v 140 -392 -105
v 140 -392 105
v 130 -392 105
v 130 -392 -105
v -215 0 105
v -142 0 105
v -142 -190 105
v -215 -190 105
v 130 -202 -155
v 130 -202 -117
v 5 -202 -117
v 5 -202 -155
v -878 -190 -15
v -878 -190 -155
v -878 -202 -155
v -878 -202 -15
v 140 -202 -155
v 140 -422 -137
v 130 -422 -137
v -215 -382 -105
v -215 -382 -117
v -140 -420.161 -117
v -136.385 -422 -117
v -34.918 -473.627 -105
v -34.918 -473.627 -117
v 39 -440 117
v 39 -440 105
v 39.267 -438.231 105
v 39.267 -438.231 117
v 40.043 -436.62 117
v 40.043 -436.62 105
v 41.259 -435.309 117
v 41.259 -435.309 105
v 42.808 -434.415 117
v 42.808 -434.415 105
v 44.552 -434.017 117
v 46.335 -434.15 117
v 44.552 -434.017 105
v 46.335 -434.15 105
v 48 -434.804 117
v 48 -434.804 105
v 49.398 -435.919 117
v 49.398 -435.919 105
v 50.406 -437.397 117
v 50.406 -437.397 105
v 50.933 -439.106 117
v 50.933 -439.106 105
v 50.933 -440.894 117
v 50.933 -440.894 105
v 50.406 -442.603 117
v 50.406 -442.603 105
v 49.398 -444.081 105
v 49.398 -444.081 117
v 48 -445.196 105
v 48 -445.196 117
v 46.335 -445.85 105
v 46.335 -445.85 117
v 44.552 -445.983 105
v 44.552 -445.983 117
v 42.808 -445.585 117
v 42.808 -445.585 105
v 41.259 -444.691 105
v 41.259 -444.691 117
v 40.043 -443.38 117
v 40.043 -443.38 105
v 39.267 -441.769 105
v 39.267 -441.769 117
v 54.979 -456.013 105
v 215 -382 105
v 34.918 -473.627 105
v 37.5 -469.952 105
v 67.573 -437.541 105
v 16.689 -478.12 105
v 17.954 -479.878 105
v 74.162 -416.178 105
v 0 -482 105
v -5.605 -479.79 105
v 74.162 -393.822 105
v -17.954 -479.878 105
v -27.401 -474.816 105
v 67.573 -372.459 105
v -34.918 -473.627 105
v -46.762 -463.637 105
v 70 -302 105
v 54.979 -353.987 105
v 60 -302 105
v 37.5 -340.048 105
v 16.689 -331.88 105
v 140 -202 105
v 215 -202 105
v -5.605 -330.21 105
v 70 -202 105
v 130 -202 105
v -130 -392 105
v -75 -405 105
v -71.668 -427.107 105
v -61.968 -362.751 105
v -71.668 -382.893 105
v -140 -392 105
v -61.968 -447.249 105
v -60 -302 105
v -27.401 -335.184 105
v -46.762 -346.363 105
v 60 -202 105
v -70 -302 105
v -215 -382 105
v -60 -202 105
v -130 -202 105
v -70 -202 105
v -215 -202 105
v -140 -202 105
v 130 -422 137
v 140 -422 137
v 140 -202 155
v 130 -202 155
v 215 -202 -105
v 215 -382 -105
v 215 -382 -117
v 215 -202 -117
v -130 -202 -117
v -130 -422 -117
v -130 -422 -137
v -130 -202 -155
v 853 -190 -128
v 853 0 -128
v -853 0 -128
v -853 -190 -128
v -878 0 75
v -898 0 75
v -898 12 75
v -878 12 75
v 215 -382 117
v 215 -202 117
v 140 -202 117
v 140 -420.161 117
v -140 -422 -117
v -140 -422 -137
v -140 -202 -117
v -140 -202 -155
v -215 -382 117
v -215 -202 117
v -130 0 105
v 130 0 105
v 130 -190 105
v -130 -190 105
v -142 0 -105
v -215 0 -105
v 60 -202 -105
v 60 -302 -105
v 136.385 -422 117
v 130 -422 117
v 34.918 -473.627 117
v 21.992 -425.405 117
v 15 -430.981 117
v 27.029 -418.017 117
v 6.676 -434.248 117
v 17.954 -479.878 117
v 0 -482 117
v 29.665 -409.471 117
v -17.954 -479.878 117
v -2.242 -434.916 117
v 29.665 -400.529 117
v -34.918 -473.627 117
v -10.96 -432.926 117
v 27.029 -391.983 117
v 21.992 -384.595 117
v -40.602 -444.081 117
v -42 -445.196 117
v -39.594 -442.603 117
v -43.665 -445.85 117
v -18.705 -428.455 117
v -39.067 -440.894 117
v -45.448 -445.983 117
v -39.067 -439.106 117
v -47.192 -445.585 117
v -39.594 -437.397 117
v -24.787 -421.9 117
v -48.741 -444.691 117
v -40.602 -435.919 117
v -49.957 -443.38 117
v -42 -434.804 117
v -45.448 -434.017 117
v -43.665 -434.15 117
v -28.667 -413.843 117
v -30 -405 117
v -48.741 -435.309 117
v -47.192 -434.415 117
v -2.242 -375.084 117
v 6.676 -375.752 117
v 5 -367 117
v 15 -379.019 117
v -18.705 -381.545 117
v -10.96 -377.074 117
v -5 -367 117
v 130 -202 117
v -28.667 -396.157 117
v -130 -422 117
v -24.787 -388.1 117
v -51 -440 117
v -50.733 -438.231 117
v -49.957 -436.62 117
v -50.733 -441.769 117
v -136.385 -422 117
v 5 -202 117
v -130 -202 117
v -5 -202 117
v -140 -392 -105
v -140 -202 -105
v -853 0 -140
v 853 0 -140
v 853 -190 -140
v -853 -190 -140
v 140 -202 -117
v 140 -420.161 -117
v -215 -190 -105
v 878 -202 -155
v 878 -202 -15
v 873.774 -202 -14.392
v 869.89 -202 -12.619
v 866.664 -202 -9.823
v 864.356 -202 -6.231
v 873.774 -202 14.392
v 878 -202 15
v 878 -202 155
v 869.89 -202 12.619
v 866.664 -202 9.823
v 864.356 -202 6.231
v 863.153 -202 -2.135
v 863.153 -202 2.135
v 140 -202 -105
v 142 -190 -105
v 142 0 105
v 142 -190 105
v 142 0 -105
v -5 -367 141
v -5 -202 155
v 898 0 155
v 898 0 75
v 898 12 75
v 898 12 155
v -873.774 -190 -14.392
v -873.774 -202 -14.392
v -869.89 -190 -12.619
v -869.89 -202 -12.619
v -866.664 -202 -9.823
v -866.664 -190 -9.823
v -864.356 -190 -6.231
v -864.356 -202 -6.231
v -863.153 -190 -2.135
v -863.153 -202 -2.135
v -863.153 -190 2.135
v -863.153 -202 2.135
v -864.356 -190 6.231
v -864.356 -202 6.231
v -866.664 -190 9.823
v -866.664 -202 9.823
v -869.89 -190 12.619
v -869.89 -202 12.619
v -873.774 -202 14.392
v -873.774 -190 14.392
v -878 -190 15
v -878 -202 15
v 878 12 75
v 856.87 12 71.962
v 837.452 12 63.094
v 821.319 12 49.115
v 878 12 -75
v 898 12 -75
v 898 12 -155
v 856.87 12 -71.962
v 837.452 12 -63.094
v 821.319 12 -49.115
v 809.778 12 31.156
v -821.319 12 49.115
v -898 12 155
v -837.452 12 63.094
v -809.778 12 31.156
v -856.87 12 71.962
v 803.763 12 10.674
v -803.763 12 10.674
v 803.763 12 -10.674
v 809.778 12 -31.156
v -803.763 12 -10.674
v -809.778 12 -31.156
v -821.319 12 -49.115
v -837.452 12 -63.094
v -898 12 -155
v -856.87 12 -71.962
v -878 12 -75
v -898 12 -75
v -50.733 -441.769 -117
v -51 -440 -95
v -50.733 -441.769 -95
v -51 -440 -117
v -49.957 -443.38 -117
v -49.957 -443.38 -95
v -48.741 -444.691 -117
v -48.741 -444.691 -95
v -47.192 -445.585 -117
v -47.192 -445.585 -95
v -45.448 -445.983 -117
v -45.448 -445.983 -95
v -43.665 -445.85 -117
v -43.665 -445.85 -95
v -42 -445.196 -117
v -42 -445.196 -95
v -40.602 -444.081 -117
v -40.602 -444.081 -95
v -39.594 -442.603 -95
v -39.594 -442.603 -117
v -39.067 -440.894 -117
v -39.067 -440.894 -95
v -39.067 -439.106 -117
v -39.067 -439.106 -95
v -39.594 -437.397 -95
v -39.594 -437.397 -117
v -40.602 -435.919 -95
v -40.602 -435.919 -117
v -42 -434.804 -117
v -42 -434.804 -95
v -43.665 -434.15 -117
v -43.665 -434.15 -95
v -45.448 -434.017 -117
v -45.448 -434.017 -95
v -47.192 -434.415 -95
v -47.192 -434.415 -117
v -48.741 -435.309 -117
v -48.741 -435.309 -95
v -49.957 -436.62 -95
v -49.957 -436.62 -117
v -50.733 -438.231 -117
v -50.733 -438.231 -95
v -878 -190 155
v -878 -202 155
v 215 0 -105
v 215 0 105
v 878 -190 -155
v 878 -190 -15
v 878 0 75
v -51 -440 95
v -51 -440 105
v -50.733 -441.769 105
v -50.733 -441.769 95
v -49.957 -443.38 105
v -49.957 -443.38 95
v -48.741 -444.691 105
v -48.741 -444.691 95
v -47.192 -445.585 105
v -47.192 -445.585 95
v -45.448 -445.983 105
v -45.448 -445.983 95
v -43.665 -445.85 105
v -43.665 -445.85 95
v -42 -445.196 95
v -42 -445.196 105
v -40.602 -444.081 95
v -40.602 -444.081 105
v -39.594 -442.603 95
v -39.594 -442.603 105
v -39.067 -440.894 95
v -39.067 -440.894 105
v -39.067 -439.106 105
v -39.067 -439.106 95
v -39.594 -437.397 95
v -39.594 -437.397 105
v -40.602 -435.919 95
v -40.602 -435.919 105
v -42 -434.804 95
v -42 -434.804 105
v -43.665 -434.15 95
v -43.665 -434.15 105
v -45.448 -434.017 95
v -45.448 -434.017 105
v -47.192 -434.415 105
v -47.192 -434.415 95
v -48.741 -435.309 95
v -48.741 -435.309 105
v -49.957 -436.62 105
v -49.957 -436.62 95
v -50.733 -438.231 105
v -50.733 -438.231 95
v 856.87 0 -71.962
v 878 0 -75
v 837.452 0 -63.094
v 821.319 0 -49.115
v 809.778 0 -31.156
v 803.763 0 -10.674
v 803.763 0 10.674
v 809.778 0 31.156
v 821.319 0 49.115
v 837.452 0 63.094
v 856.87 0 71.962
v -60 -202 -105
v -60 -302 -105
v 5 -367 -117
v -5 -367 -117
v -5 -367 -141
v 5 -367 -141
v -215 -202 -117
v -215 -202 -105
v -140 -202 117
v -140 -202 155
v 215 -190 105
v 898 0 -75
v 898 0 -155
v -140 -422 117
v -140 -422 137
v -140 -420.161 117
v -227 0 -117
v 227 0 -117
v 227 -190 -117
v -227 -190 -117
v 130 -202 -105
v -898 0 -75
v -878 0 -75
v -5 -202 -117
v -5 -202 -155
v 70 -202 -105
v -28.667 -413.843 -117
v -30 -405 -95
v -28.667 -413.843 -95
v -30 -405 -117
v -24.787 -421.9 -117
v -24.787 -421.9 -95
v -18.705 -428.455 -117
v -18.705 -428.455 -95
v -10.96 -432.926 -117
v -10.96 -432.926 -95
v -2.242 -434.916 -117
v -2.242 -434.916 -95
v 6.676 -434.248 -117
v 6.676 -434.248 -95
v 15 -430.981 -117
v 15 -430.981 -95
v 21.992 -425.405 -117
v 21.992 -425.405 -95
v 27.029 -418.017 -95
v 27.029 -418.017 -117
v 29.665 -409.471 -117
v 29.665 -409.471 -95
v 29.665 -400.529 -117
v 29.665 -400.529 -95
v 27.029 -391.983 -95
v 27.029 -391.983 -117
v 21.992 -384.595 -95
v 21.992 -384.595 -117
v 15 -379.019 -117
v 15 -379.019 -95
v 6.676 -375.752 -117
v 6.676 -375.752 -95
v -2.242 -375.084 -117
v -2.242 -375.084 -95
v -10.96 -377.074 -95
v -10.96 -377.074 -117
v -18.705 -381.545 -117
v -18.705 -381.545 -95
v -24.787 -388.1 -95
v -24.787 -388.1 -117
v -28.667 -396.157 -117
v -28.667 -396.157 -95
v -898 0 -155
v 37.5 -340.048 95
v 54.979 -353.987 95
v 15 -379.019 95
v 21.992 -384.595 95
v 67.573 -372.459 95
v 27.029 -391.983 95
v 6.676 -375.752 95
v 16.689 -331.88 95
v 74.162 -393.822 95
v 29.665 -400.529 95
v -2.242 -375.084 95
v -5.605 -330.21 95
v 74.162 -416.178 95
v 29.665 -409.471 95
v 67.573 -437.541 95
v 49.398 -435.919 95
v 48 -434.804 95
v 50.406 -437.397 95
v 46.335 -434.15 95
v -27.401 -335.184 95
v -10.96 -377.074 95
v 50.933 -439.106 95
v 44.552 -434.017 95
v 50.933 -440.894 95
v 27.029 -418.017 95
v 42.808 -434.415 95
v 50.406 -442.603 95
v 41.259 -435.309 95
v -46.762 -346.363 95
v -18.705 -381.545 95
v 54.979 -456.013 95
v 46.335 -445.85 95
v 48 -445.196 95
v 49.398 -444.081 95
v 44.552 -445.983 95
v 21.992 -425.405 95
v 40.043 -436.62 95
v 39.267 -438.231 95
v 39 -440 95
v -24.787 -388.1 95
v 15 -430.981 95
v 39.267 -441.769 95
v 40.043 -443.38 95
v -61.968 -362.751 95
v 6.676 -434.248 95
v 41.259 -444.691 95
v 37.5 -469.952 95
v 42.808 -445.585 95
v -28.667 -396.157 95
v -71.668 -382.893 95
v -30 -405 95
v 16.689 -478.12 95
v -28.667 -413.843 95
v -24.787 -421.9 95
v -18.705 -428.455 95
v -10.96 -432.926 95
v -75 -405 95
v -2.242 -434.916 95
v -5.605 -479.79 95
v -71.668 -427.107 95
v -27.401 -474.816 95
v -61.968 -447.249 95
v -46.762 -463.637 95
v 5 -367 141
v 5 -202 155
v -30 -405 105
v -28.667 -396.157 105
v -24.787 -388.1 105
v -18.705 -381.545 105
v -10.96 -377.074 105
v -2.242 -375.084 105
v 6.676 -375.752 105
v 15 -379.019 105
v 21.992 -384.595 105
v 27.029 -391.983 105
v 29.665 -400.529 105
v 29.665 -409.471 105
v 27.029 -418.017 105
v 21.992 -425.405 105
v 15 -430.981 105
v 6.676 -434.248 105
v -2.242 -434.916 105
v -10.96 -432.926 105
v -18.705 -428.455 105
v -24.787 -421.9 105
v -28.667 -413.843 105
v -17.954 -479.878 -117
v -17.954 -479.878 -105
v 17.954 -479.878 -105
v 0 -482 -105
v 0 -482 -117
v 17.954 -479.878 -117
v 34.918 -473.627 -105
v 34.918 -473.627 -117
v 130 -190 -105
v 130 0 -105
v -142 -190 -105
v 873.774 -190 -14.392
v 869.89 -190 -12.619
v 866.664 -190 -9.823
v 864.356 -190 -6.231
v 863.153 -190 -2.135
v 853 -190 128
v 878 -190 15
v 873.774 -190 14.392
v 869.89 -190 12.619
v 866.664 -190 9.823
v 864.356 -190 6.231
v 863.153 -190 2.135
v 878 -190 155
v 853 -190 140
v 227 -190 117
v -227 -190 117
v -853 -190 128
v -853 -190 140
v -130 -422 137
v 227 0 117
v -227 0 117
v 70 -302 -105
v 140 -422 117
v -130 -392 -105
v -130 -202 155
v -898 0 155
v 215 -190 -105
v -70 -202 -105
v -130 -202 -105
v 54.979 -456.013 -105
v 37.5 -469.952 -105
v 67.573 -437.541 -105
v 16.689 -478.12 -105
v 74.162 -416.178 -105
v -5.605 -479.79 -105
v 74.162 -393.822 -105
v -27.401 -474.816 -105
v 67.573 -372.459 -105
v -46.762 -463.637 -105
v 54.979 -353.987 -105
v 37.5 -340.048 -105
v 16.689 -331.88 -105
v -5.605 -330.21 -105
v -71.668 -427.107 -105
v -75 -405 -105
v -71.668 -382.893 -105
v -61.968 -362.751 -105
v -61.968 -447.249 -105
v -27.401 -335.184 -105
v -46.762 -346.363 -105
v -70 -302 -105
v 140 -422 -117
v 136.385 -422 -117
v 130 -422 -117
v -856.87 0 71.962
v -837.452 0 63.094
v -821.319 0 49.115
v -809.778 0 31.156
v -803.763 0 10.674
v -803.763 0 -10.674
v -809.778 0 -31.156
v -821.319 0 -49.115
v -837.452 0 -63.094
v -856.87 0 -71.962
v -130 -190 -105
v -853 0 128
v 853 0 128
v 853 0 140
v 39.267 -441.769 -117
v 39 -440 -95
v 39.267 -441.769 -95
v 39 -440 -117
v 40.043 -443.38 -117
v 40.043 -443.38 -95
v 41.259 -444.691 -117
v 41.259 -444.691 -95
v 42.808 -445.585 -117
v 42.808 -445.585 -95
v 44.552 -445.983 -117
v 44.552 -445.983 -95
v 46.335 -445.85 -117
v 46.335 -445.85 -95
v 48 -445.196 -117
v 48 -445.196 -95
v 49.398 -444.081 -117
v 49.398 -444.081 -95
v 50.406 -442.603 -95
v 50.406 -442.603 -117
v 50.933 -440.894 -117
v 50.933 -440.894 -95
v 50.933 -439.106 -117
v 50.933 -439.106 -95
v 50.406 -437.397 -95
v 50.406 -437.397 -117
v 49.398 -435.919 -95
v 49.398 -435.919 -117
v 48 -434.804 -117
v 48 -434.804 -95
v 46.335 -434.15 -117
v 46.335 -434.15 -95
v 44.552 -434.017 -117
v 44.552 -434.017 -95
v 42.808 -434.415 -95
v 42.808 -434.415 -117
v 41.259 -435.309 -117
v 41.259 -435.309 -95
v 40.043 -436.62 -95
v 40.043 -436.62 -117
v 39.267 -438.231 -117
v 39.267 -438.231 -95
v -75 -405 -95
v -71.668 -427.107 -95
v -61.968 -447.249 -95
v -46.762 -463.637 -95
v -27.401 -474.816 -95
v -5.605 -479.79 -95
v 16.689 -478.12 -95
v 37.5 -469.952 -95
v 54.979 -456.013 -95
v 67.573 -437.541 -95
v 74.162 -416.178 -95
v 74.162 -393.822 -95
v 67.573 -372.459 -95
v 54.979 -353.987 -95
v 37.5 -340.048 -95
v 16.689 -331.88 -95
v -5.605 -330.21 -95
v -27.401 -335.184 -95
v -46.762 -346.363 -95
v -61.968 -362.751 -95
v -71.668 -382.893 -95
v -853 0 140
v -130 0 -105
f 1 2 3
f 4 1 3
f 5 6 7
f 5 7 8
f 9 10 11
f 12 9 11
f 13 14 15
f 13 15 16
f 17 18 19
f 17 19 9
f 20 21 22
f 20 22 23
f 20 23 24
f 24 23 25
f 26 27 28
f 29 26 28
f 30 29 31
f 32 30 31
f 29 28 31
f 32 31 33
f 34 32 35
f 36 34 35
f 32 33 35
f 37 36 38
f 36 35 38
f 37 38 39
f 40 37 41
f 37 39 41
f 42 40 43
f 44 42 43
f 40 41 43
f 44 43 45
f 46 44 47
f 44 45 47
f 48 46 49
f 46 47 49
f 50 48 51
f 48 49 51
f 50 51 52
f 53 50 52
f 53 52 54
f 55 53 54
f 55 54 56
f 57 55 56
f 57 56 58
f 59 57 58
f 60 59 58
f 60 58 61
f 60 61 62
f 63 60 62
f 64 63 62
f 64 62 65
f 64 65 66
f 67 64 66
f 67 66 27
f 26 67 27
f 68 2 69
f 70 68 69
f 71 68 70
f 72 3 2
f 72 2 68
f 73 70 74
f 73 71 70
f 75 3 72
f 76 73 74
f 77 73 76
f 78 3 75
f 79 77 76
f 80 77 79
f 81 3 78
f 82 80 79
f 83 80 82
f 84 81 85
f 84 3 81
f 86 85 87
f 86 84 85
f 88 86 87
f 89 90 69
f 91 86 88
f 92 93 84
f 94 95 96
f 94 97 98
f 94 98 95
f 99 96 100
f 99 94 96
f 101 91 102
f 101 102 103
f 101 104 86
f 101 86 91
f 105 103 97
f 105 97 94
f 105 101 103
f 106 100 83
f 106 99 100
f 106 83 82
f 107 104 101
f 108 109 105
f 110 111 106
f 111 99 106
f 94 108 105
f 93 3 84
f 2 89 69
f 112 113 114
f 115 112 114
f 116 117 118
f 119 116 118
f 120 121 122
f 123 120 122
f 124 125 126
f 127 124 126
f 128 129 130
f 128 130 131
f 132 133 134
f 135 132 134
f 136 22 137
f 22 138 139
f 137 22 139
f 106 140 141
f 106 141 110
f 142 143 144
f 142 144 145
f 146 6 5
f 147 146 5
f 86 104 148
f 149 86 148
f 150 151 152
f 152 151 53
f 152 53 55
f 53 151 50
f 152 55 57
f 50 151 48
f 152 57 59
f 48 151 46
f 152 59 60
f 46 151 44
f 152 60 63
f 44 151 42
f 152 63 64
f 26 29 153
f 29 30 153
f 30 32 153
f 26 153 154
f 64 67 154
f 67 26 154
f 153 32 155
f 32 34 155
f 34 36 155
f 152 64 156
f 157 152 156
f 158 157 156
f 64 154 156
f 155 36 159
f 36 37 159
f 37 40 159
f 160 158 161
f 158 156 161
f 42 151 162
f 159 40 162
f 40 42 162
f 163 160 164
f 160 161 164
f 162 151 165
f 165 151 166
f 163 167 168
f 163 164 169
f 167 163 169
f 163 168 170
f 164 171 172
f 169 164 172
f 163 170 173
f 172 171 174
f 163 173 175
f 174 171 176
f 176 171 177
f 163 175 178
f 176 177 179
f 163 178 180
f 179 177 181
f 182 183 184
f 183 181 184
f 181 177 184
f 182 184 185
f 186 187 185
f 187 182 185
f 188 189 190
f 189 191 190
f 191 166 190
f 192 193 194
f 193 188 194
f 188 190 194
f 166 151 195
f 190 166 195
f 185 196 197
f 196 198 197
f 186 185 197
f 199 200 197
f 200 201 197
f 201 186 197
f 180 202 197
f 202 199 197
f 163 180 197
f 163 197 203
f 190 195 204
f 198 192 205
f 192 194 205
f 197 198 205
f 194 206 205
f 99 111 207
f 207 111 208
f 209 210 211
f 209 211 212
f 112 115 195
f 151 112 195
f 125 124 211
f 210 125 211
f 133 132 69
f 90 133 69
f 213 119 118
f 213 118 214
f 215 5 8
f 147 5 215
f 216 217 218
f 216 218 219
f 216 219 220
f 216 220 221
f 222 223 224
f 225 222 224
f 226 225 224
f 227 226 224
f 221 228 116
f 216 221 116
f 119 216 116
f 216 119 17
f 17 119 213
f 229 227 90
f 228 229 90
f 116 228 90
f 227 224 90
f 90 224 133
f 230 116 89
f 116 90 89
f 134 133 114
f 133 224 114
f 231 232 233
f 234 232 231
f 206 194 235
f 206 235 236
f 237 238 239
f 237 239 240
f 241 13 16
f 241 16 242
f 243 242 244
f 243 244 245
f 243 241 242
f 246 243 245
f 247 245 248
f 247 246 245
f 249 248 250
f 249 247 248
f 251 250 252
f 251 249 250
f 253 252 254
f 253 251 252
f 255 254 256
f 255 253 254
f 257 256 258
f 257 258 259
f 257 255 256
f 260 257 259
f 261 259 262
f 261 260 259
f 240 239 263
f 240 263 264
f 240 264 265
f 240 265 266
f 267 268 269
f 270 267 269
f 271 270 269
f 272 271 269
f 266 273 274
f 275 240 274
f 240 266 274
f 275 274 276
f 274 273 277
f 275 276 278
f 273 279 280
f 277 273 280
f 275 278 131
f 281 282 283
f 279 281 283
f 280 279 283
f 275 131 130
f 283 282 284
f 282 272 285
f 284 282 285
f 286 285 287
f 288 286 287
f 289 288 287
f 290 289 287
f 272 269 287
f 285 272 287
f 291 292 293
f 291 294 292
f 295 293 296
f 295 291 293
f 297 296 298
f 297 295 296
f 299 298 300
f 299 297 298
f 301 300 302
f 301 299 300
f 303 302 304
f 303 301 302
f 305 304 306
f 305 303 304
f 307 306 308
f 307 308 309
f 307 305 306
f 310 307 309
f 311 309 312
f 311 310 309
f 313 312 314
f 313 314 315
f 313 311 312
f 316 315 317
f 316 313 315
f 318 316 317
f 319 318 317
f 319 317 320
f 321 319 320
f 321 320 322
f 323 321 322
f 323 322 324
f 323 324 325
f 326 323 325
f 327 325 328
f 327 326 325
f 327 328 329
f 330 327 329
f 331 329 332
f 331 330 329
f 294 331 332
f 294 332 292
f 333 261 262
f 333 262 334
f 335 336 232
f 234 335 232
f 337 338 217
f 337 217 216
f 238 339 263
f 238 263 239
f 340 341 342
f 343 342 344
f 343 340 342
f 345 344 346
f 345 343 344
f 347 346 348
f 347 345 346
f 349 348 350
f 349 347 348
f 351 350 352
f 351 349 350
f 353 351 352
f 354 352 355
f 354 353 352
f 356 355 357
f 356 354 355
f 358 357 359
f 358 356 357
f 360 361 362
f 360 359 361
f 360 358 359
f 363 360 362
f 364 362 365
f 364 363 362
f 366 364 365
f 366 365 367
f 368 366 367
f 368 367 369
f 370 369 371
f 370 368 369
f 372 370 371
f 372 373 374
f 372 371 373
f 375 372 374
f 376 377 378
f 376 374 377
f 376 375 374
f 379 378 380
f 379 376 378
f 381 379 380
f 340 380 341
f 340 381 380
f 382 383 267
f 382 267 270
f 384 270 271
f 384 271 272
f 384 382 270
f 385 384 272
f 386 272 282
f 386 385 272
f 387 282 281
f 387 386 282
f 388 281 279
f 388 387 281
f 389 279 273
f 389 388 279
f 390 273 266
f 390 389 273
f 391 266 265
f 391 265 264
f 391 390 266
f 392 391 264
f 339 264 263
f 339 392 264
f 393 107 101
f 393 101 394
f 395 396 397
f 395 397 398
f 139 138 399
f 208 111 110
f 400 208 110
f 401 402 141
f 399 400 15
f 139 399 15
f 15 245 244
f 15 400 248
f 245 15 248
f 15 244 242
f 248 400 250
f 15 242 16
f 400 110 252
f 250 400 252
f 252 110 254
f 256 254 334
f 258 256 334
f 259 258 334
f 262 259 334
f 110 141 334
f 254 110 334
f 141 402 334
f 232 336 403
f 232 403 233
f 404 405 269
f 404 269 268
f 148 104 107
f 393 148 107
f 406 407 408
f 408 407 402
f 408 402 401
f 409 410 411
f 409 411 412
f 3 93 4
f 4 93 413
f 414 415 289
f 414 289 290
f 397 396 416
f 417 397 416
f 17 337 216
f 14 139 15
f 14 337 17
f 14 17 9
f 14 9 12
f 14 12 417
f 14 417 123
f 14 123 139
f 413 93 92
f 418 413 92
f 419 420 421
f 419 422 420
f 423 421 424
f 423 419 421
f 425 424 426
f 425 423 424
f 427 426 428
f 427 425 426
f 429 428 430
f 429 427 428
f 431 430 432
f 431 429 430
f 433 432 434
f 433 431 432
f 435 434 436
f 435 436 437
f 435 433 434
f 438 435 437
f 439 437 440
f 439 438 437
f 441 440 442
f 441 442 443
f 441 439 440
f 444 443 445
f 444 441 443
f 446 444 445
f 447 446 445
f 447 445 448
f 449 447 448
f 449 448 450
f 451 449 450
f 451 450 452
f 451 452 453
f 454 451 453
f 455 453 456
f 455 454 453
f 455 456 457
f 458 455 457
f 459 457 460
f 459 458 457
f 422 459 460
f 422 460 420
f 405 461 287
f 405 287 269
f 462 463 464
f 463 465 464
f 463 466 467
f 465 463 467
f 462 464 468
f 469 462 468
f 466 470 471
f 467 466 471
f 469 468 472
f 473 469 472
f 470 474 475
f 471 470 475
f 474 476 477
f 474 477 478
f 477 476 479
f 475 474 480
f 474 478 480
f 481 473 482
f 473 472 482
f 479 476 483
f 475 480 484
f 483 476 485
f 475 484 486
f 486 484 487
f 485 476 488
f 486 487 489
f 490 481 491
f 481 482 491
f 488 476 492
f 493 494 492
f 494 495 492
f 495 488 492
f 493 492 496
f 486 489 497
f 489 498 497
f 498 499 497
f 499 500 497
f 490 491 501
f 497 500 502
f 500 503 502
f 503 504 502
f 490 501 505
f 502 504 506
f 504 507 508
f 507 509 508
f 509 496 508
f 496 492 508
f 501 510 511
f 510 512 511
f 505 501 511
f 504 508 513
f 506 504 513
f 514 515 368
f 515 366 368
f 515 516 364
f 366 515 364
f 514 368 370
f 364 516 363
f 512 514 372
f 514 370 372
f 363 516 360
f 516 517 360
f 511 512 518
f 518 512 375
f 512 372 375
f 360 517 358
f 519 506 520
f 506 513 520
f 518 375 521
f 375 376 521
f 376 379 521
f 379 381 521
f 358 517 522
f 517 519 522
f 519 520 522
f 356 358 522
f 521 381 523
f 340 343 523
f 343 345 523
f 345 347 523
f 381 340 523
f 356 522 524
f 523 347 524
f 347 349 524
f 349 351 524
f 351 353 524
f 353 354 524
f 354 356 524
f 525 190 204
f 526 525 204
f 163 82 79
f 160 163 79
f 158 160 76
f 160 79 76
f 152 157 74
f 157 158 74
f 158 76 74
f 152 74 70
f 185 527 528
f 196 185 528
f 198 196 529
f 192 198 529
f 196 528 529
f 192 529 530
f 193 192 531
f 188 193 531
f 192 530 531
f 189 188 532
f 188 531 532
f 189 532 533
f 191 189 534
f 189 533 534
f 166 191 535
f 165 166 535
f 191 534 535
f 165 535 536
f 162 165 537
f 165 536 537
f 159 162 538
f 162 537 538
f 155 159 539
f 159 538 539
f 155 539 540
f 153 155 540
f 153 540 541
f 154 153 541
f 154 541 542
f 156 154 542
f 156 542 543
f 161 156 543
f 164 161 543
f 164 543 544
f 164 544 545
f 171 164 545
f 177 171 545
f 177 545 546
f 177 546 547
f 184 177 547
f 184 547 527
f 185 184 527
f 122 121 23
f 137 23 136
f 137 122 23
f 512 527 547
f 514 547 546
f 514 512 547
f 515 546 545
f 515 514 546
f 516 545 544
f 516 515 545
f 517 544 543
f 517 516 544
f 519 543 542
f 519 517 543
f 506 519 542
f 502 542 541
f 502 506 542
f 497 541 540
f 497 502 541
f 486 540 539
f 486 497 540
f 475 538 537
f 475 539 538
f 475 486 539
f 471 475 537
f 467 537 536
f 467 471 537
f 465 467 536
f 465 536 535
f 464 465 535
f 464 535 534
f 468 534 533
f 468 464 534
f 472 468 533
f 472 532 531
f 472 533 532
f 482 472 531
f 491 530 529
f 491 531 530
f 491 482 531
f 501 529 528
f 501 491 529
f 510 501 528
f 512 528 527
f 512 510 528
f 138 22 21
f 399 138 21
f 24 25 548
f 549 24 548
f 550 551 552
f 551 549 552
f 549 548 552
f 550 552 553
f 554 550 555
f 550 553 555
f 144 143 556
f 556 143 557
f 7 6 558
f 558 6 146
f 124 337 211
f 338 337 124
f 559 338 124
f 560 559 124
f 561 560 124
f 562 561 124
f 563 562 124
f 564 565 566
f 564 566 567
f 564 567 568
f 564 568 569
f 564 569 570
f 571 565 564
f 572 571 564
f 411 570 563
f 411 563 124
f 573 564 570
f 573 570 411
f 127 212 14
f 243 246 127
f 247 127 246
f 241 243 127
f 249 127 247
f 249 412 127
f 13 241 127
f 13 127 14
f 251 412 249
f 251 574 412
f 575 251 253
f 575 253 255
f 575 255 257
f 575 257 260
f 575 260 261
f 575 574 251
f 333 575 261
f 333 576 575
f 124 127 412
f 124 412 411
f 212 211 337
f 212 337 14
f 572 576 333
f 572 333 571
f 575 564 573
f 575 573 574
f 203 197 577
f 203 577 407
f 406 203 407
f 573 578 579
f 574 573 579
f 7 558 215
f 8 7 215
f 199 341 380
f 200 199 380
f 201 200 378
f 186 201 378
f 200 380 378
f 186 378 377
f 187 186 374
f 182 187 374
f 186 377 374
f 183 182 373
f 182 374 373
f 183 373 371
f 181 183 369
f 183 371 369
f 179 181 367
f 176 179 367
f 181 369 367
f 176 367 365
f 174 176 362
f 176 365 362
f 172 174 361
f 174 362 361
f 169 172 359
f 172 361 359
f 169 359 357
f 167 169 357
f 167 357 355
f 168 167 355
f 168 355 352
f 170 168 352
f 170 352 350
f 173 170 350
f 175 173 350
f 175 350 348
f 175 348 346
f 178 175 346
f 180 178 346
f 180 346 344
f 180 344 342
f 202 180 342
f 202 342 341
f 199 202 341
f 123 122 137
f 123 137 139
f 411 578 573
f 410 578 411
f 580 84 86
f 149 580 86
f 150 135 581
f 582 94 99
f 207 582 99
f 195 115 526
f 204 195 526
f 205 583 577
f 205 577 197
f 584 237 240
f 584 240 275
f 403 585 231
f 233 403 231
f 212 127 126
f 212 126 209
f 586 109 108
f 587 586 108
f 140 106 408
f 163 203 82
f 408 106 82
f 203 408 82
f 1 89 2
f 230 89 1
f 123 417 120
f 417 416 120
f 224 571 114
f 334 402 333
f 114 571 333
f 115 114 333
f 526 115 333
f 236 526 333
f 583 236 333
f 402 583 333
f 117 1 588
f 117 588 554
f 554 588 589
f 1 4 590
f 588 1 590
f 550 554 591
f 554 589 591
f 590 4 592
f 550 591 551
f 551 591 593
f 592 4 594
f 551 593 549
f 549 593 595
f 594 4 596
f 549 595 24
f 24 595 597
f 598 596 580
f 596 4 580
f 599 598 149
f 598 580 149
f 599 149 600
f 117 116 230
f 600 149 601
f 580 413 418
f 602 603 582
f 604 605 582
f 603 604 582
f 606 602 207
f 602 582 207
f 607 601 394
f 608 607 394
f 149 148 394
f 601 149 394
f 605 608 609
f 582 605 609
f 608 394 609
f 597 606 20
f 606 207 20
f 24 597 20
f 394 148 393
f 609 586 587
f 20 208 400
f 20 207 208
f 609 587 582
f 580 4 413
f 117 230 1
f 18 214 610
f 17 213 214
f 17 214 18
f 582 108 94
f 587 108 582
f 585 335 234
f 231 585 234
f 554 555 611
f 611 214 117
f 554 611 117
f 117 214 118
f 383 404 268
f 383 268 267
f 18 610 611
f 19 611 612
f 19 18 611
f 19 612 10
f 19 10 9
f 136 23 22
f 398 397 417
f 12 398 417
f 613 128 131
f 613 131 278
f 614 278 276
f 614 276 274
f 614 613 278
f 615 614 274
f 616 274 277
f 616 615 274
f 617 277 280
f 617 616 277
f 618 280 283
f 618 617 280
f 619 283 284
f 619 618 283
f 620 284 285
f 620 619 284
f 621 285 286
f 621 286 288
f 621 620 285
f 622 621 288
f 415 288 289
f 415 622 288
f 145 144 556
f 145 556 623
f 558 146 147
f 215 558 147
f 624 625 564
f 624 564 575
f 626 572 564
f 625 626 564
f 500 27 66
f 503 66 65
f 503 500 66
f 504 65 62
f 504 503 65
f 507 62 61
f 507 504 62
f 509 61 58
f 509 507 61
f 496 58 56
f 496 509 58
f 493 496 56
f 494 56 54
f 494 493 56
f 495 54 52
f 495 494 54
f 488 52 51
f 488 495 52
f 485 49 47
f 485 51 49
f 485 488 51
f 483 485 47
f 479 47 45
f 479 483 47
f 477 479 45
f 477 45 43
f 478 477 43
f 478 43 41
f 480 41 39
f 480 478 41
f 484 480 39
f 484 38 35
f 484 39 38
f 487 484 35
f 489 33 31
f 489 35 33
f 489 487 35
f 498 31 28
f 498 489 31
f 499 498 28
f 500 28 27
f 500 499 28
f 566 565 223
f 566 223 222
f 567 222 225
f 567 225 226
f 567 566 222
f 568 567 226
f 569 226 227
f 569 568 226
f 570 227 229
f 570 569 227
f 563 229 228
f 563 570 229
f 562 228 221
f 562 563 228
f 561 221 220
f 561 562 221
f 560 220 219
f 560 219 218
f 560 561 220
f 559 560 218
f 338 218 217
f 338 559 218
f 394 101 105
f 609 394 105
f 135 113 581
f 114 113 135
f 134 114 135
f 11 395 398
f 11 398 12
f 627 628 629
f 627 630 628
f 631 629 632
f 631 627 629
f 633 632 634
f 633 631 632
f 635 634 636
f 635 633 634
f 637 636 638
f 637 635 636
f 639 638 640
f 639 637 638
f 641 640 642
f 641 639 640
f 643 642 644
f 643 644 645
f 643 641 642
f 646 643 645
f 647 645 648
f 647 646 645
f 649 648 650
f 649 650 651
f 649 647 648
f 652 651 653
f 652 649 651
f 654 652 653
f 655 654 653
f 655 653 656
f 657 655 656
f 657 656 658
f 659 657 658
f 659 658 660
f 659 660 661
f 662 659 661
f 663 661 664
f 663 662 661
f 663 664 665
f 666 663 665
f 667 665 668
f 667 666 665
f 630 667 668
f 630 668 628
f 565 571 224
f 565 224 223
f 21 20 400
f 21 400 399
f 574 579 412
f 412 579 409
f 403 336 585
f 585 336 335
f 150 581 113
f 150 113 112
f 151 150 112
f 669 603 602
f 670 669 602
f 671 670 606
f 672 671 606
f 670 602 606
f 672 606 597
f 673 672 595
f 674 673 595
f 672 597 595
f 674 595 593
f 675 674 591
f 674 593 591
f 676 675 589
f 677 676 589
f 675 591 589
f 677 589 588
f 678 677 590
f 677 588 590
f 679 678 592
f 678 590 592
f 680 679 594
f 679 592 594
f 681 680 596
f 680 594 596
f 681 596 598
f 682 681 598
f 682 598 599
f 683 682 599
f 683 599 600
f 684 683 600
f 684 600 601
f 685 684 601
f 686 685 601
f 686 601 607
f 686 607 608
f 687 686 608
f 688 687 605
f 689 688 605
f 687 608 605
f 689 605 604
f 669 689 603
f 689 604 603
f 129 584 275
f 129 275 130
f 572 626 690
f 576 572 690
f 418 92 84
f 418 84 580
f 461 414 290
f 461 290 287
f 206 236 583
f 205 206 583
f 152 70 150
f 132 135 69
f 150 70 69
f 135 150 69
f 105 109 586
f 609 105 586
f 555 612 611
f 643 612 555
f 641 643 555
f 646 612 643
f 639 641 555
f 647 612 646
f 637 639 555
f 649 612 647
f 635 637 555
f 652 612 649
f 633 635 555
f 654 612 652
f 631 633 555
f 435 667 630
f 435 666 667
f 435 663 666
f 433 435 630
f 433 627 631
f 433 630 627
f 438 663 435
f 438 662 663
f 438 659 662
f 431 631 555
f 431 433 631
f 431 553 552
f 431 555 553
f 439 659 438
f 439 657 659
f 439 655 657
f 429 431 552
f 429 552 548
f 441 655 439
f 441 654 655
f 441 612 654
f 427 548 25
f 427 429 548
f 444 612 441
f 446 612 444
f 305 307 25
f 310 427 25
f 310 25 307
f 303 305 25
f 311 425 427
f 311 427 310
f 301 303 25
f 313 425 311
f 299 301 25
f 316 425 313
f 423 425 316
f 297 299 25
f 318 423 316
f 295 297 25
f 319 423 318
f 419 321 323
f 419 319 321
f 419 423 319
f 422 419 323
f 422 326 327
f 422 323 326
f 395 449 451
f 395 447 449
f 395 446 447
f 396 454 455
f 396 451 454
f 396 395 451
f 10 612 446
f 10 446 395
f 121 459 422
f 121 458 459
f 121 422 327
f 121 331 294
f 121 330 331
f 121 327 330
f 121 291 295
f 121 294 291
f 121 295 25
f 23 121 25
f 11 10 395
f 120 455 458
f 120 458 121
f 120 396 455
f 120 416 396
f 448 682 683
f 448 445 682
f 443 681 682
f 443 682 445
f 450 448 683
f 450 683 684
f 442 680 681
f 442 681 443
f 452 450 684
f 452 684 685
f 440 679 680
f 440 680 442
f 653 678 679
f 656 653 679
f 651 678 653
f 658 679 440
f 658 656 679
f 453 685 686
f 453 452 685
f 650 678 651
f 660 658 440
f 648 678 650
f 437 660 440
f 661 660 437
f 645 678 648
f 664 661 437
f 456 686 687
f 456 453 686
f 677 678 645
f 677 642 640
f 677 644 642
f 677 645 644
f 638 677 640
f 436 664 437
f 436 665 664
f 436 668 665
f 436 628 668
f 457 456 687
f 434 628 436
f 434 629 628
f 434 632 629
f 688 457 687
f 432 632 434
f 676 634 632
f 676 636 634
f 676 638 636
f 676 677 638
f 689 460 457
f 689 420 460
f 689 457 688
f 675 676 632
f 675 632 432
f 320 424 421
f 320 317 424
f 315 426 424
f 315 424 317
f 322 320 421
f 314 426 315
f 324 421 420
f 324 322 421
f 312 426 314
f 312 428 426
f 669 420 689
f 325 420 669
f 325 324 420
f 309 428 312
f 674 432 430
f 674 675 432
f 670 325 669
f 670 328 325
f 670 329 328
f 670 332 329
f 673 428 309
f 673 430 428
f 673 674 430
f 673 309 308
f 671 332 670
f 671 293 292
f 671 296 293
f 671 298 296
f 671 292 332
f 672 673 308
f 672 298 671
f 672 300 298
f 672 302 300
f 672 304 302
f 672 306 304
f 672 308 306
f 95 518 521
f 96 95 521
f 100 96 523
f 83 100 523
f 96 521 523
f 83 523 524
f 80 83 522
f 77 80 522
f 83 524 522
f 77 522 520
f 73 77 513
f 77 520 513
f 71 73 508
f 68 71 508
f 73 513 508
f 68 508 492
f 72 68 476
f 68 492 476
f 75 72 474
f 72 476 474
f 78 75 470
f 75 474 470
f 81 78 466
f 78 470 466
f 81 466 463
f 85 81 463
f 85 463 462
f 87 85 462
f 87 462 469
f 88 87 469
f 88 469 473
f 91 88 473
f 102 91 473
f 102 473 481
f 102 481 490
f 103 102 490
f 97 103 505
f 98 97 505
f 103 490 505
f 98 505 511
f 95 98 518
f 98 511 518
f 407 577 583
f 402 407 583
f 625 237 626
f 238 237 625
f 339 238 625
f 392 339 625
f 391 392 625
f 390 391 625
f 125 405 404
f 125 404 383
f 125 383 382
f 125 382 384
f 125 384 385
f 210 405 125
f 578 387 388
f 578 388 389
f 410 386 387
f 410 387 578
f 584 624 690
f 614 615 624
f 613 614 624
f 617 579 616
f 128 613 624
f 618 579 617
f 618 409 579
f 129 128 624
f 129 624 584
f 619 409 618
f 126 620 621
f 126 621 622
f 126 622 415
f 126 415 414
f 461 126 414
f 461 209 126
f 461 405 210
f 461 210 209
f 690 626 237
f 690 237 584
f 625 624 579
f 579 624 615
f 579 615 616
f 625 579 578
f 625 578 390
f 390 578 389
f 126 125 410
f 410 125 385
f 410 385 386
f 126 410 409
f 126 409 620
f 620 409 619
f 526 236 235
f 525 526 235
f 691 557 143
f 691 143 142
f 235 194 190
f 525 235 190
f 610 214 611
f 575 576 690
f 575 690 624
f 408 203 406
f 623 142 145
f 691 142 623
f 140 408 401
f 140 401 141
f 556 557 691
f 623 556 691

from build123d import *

# Parameters (mm, degrees)
EXTRUDE_1_DEPTH        = 12
SKETCH_2_W             = 1706
SKETCH_2_H             = 12
EXTRUDE_2_DEPTH        = 190
EXTRUDE_3_DEPTH        = 12
SKETCH_4_W             = 430
SKETCH_4_H             = 12
EXTRUDE_4_DEPTH        = 502
SKETCH_5_R             = 30
SKETCH_5_R_2           = 6
CUT_EXTRUDE_1_DEPTH    = 1065.139088653
SKETCH_6_W             = 10
SKETCH_6_H             = 165
EXTRUDE_5_DEPTH        = 38
CUT_EXTRUDE_2_DEPTH    = 10
SKETCH_8_W             = 10
SKETCH_8_H             = 210
EXTRUDE_6_DEPTH        = 190
SKETCH_9_W             = 10
SKETCH_9_H             = 38
EXTRUDE_7_DEPTH        = 220
CUT_EXTRUDE_3_DEPTH    = 18
PATTERN_LINEAR_1_COUNT = 2
PATTERN_LINEAR_1_PITCH = 270
SKETCH_11_W            = 12
SKETCH_11_H            = 234
SKETCH_11_H_2          = 210
EXTRUDE_8_DEPTH        = 190
SKETCH_12_R            = 75
SKETCH_12_R_2          = 30
SKETCH_12_R_3          = 6
EXTRUDE_9_DEPTH        = 10
PATTERN_LINEAR_2_COUNT = 2
PATTERN_LINEAR_2_PITCH = 200
SKETCH_14_W            = 10
SKETCH_14_H            = 210
EXTRUDE_10_DEPTH       = 100


with BuildPart() as part:
    # 草图1 → 凸台-拉伸1 (new body)
    with BuildSketch(Plane(origin=(0, 0, 0), x_dir=(1, 0, 0), z_dir=(0, 1, 0))):
        with BuildLine():
            Line((-898, 155), (898, 155))
            Line((898, 155), (898, 75))
            Line((898, 75), (878, 75))
            ThreePointArc((878, 75), (803, 0), (878, -75))
            Line((878, -75), (898, -75))
            Line((898, -75), (898, -155))
            Line((898, -155), (-898, -155))
            Line((-898, -155), (-898, -75))
            Line((-898, -75), (-878, -75))
            ThreePointArc((-878, -75), (-803, 0), (-878, 75))
            Line((-878, 75), (-898, 75))
            Line((-898, 75), (-898, 155))
        make_face()
    extrude(amount=EXTRUDE_1_DEPTH)

    # 草图2 → 凸台-拉伸2 (add)
    with BuildSketch(Plane(origin=(0, 0, 0), x_dir=(-1, 0, 0), z_dir=(0, -1, 0))):
        with Locations((0, 134)):
            Rectangle(SKETCH_2_W, SKETCH_2_H)
        with Locations((0, -134)):
            Rectangle(SKETCH_2_W, SKETCH_2_H)
    extrude(amount=EXTRUDE_2_DEPTH)

    # 草图3 → 凸台-拉伸3 (add)
    with BuildSketch(Plane.XZ.offset(190)):
        with BuildLine():
            Line((-878, 155), (878, 155))
            Line((878, 155), (878, 15))
            ThreePointArc((878, 15), (863, 0), (878, -15))
            Line((878, -15), (878, -155))
            Line((878, -155), (-878, -155))
            Line((-878, -155), (-878, -15))
            ThreePointArc((-878, -15), (-863, 0), (-878, 15))
            Line((-878, 15), (-878, 155))
        make_face()
    extrude(amount=EXTRUDE_3_DEPTH)

    # 草图4 → 凸台-拉伸4 (add)
    with BuildSketch(Plane(origin=(0, 0, 0), x_dir=(-1, 0, 0), z_dir=(0, -1, 0))):
        with Locations((0, -111)):
            Rectangle(SKETCH_4_W, SKETCH_4_H)
        with Locations((0, 111)):
            Rectangle(SKETCH_4_W, SKETCH_4_H)
    extrude(amount=EXTRUDE_4_DEPTH)

    # 草图5 → 切除-拉伸1 (cut, through all)
    with BuildSketch(Plane(origin=(0, 0, -117), x_dir=(-1, 0, 0), z_dir=(0, 0, -1))):
        with Locations((0, -405)):
            Circle(SKETCH_5_R)
        with Locations((-45, -440)):
            Circle(SKETCH_5_R_2)
        with Locations((45, -440)):
            Circle(SKETCH_5_R_2)
        with BuildLine():
            Line((-215, -382), (-215, -502))
            Line((-215, -502), (215, -502))
            Line((215, -502), (215, -382))
            Line((215, -382), (34.918275337, -473.627356408))
            ThreePointArc((34.918275337, -473.627356408), (0, -482), (-34.918275337, -473.627356408))
            Line((-34.918275337, -473.627356408), (-215, -382))
        make_face()
    extrude(amount=-CUT_EXTRUDE_1_DEPTH, mode=Mode.SUBTRACT)

    # 草图6 → 凸台-拉伸5 (add)
    with BuildSketch(Plane.XY.offset(117)):
        with Locations((0, -284.5)):
            Rectangle(SKETCH_6_W, SKETCH_6_H)
    extrude_5 = extrude(amount=EXTRUDE_5_DEPTH)

    # 镜向1: 凸台-拉伸5 across plane
    add(extrude_5.mirror(Plane.XY))

    # 草图7 → 切除-拉伸2 (cut)
    with BuildSketch(Plane.ZY.offset(5)):
        Polygon((-155, -202), (-155, -367), (-141, -367), align=None)
        Polygon((155, -202), (141, -367), (155, -367), align=None)
    extrude(amount=-CUT_EXTRUDE_2_DEPTH, mode=Mode.SUBTRACT)

    # 草图8 → 凸台-拉伸6 (add)
    with BuildSketch(Plane(origin=(0, -202, 0), x_dir=(-1, 0, 0), z_dir=(0, -1, 0))):
        with Locations((135, 0)):
            Rectangle(SKETCH_8_W, SKETCH_8_H)
        with Locations((-135, 0)):
            Rectangle(SKETCH_8_W, SKETCH_8_H)
    extrude(amount=EXTRUDE_6_DEPTH)

    # 草图9 → 凸台-拉伸7 (add)
    with BuildSketch(Plane(origin=(0, -202, 0), x_dir=(-1, 0, 0), z_dir=(0, -1, 0))):
        with Locations((135, -136)):
            Rectangle(SKETCH_9_W, SKETCH_9_H)
        with Locations((-135, -136)):
            Rectangle(SKETCH_9_W, SKETCH_9_H)
        with Locations((135, 136)):
            Rectangle(SKETCH_9_W, SKETCH_9_H)
        with Locations((-135, 136)):
            Rectangle(SKETCH_9_W, SKETCH_9_H)
    extrude(amount=EXTRUDE_7_DEPTH)

    # 草图10 → 切除-拉伸3 (cut)
    with BuildSketch(Plane(origin=(140, 0, 0), x_dir=(0, 0, -1), z_dir=(1, 0, 0))):
        Polygon((-155, -202), (-155, -422), (-137, -422), align=None)
        Polygon((155, -202), (155, -422), (137, -422), align=None)
    cut_extrude_3 = extrude(amount=-CUT_EXTRUDE_3_DEPTH, mode=Mode.SUBTRACT)

    # 阵列(线性)1: 切除-拉伸3 ×2
    with Locations(*[(-i * PATTERN_LINEAR_1_PITCH, 0, 0) for i in range(1, PATTERN_LINEAR_1_COUNT)]):
        add(cut_extrude_3, mode=Mode.SUBTRACT)

    # 草图11 → 凸台-拉伸8 (add)
    with BuildSketch(Plane(origin=(0, 0, 0), x_dir=(-1, 0, 0), z_dir=(0, -1, 0))):
        with Locations((-221, 0)):
            Rectangle(SKETCH_11_W, SKETCH_11_H)
        with Locations((221, 0)):
            Rectangle(SKETCH_11_W, SKETCH_11_H)
        with Locations((136, 0)):
            Rectangle(SKETCH_11_W, SKETCH_11_H_2)
        with Locations((-136, 0)):
            Rectangle(SKETCH_11_W, SKETCH_11_H_2)
    extrude(amount=EXTRUDE_8_DEPTH)

    # 草图12 → 凸台-拉伸9 (add)
    with BuildSketch(Plane.XY.offset(-105)):
        with Locations(Location((0, -405, 0), (0, 0, 180))):
            Circle(SKETCH_12_R)
        with Locations(Location((0, -405, 0), (0, 0, 180))):
            Circle(SKETCH_12_R_2, mode=Mode.SUBTRACT)
        with Locations(Location((-45, -440, 0), (0, 0, 180))):
            Circle(SKETCH_12_R_3, mode=Mode.SUBTRACT)
        with Locations(Location((45, -440, 0), (0, 0, 180))):
            Circle(SKETCH_12_R_3, mode=Mode.SUBTRACT)
    extrude_9 = extrude(amount=EXTRUDE_9_DEPTH)

    # 阵列(线性)2: 凸台-拉伸9 ×2
    with Locations(*[(0, 0, i * PATTERN_LINEAR_2_PITCH) for i in range(1, PATTERN_LINEAR_2_COUNT)]):
        add(extrude_9)

    # 草图14 → 凸台-拉伸10 (add)
    with BuildSketch(Plane(origin=(0, -202, 0), x_dir=(-1, 0, 0), z_dir=(0, -1, 0))):
        with Locations((65, 0)):
            Rectangle(SKETCH_14_W, SKETCH_14_H)
        with Locations((-65, 0)):
            Rectangle(SKETCH_14_W, SKETCH_14_H)
    extrude(amount=EXTRUDE_10_DEPTH)


solid = part.part
